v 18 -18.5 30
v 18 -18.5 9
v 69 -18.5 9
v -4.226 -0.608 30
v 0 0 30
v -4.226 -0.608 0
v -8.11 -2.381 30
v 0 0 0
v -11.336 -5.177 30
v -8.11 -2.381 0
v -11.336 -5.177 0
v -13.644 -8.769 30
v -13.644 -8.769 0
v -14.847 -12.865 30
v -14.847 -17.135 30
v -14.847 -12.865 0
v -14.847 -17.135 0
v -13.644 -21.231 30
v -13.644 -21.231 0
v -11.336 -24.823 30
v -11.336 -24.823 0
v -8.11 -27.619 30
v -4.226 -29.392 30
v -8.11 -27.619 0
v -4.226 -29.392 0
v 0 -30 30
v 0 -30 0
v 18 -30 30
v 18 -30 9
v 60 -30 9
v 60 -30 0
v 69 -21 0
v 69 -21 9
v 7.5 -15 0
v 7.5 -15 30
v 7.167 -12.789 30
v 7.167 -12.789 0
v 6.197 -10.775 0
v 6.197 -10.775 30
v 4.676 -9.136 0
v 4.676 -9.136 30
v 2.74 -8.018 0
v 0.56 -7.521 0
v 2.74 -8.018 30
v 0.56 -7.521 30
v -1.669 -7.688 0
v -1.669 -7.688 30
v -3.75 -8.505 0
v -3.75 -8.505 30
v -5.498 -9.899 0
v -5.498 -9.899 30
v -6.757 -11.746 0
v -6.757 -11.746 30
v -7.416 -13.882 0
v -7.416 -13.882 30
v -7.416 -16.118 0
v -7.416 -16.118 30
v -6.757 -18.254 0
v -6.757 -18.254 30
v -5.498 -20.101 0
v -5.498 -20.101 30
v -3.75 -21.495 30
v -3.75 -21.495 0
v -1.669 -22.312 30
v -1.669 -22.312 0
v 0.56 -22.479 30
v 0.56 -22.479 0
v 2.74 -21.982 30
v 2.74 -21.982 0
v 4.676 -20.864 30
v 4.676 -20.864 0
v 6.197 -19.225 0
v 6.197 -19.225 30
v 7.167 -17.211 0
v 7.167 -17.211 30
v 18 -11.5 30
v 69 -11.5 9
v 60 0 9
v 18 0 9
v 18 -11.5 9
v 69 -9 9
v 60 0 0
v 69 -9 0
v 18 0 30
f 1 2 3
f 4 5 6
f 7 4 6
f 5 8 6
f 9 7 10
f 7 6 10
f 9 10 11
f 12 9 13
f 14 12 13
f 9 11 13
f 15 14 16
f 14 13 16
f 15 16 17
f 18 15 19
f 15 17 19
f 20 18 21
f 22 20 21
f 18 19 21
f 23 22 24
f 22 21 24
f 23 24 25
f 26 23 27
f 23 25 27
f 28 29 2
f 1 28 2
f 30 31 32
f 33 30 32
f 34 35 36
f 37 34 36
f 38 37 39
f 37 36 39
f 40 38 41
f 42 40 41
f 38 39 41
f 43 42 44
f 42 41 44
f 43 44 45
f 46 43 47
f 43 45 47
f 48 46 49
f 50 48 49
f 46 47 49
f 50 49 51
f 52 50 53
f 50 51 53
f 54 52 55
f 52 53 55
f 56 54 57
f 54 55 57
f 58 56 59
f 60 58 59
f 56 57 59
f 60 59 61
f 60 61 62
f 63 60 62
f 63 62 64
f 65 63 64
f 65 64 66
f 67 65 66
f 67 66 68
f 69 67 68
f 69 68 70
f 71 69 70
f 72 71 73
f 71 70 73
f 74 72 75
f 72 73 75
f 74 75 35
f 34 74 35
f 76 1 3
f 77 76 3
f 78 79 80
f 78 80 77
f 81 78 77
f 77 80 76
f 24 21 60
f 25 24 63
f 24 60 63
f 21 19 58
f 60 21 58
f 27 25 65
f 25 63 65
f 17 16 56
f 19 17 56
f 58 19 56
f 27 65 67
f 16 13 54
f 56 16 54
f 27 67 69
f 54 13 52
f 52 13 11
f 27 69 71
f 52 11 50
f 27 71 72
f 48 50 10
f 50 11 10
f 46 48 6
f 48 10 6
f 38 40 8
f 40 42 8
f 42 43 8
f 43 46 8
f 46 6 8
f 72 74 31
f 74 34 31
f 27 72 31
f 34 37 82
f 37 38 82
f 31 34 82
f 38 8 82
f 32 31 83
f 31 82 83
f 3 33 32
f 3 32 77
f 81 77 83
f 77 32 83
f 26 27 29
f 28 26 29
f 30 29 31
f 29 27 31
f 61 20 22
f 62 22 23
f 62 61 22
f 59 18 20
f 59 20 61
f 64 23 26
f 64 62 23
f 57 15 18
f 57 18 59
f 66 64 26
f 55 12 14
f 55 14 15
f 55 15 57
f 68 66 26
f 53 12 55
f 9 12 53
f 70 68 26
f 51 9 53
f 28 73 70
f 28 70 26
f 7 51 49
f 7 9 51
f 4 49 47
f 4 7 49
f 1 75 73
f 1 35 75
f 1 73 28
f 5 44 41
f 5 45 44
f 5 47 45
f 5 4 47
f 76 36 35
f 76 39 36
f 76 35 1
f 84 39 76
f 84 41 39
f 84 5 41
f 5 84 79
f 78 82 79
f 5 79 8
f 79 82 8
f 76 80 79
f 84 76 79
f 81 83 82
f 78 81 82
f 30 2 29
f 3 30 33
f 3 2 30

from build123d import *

# Parameters (mm, degrees)
F1_DEPTH = 9
F3_DEPTH = 21
F4_R     = 7.5
F5_DEPTH = 30
F6_W     = 51
F6_H     = 7
F7_DEPTH = 21
F9_DEPTH = 25


with BuildPart() as f1:
    # F0 (on Top) → F1 (new body)
    with BuildSketch(Plane.XY):
        with BuildLine():
            Line((60, 0), (0, 0))
            ThreePointArc((0, 0), (-15, -15), (0, -30))
            Line((0, -30), (60, -30))
            Line((60, -30), (69, -21))
            Line((69, -21), (69, -9))
            Line((69, -9), (60, 0))
        make_face()
    extrude(amount=F1_DEPTH)

    # F2 (on face) → F3 (join)
    with BuildSketch(Plane.XY.offset(9)):
        with BuildLine():
            Line((18, -30), (18, 0))
            Line((18, 0), (0, 0))
            ThreePointArc((0, 0), (-15, -15), (0, -30))
            Line((0, -30), (18, -30))
        make_face()
    extrude(amount=F3_DEPTH)

    # F4 (on face) → F5 (cut)
    with BuildSketch(Plane.XY.offset(30)):
        with Locations((0, -15)):
            Circle(F4_R)
    extrude(amount=-F5_DEPTH, mode=Mode.SUBTRACT)

    # F6 (on face) → F7 (join)
    with BuildSketch(Plane.XY.offset(9)):
        with Locations((43.5, -15)):
            Rectangle(F6_W, F6_H)
    extrude(amount=F7_DEPTH)

    # F8 (on face) → F9 (cut)
    with BuildSketch(Plane.XZ.offset(18.5)):
        Polygon((69, 30), (18, 30), (69, 9), align=None)
    extrude(amount=-F9_DEPTH, mode=Mode.SUBTRACT)


solid = f1.part
